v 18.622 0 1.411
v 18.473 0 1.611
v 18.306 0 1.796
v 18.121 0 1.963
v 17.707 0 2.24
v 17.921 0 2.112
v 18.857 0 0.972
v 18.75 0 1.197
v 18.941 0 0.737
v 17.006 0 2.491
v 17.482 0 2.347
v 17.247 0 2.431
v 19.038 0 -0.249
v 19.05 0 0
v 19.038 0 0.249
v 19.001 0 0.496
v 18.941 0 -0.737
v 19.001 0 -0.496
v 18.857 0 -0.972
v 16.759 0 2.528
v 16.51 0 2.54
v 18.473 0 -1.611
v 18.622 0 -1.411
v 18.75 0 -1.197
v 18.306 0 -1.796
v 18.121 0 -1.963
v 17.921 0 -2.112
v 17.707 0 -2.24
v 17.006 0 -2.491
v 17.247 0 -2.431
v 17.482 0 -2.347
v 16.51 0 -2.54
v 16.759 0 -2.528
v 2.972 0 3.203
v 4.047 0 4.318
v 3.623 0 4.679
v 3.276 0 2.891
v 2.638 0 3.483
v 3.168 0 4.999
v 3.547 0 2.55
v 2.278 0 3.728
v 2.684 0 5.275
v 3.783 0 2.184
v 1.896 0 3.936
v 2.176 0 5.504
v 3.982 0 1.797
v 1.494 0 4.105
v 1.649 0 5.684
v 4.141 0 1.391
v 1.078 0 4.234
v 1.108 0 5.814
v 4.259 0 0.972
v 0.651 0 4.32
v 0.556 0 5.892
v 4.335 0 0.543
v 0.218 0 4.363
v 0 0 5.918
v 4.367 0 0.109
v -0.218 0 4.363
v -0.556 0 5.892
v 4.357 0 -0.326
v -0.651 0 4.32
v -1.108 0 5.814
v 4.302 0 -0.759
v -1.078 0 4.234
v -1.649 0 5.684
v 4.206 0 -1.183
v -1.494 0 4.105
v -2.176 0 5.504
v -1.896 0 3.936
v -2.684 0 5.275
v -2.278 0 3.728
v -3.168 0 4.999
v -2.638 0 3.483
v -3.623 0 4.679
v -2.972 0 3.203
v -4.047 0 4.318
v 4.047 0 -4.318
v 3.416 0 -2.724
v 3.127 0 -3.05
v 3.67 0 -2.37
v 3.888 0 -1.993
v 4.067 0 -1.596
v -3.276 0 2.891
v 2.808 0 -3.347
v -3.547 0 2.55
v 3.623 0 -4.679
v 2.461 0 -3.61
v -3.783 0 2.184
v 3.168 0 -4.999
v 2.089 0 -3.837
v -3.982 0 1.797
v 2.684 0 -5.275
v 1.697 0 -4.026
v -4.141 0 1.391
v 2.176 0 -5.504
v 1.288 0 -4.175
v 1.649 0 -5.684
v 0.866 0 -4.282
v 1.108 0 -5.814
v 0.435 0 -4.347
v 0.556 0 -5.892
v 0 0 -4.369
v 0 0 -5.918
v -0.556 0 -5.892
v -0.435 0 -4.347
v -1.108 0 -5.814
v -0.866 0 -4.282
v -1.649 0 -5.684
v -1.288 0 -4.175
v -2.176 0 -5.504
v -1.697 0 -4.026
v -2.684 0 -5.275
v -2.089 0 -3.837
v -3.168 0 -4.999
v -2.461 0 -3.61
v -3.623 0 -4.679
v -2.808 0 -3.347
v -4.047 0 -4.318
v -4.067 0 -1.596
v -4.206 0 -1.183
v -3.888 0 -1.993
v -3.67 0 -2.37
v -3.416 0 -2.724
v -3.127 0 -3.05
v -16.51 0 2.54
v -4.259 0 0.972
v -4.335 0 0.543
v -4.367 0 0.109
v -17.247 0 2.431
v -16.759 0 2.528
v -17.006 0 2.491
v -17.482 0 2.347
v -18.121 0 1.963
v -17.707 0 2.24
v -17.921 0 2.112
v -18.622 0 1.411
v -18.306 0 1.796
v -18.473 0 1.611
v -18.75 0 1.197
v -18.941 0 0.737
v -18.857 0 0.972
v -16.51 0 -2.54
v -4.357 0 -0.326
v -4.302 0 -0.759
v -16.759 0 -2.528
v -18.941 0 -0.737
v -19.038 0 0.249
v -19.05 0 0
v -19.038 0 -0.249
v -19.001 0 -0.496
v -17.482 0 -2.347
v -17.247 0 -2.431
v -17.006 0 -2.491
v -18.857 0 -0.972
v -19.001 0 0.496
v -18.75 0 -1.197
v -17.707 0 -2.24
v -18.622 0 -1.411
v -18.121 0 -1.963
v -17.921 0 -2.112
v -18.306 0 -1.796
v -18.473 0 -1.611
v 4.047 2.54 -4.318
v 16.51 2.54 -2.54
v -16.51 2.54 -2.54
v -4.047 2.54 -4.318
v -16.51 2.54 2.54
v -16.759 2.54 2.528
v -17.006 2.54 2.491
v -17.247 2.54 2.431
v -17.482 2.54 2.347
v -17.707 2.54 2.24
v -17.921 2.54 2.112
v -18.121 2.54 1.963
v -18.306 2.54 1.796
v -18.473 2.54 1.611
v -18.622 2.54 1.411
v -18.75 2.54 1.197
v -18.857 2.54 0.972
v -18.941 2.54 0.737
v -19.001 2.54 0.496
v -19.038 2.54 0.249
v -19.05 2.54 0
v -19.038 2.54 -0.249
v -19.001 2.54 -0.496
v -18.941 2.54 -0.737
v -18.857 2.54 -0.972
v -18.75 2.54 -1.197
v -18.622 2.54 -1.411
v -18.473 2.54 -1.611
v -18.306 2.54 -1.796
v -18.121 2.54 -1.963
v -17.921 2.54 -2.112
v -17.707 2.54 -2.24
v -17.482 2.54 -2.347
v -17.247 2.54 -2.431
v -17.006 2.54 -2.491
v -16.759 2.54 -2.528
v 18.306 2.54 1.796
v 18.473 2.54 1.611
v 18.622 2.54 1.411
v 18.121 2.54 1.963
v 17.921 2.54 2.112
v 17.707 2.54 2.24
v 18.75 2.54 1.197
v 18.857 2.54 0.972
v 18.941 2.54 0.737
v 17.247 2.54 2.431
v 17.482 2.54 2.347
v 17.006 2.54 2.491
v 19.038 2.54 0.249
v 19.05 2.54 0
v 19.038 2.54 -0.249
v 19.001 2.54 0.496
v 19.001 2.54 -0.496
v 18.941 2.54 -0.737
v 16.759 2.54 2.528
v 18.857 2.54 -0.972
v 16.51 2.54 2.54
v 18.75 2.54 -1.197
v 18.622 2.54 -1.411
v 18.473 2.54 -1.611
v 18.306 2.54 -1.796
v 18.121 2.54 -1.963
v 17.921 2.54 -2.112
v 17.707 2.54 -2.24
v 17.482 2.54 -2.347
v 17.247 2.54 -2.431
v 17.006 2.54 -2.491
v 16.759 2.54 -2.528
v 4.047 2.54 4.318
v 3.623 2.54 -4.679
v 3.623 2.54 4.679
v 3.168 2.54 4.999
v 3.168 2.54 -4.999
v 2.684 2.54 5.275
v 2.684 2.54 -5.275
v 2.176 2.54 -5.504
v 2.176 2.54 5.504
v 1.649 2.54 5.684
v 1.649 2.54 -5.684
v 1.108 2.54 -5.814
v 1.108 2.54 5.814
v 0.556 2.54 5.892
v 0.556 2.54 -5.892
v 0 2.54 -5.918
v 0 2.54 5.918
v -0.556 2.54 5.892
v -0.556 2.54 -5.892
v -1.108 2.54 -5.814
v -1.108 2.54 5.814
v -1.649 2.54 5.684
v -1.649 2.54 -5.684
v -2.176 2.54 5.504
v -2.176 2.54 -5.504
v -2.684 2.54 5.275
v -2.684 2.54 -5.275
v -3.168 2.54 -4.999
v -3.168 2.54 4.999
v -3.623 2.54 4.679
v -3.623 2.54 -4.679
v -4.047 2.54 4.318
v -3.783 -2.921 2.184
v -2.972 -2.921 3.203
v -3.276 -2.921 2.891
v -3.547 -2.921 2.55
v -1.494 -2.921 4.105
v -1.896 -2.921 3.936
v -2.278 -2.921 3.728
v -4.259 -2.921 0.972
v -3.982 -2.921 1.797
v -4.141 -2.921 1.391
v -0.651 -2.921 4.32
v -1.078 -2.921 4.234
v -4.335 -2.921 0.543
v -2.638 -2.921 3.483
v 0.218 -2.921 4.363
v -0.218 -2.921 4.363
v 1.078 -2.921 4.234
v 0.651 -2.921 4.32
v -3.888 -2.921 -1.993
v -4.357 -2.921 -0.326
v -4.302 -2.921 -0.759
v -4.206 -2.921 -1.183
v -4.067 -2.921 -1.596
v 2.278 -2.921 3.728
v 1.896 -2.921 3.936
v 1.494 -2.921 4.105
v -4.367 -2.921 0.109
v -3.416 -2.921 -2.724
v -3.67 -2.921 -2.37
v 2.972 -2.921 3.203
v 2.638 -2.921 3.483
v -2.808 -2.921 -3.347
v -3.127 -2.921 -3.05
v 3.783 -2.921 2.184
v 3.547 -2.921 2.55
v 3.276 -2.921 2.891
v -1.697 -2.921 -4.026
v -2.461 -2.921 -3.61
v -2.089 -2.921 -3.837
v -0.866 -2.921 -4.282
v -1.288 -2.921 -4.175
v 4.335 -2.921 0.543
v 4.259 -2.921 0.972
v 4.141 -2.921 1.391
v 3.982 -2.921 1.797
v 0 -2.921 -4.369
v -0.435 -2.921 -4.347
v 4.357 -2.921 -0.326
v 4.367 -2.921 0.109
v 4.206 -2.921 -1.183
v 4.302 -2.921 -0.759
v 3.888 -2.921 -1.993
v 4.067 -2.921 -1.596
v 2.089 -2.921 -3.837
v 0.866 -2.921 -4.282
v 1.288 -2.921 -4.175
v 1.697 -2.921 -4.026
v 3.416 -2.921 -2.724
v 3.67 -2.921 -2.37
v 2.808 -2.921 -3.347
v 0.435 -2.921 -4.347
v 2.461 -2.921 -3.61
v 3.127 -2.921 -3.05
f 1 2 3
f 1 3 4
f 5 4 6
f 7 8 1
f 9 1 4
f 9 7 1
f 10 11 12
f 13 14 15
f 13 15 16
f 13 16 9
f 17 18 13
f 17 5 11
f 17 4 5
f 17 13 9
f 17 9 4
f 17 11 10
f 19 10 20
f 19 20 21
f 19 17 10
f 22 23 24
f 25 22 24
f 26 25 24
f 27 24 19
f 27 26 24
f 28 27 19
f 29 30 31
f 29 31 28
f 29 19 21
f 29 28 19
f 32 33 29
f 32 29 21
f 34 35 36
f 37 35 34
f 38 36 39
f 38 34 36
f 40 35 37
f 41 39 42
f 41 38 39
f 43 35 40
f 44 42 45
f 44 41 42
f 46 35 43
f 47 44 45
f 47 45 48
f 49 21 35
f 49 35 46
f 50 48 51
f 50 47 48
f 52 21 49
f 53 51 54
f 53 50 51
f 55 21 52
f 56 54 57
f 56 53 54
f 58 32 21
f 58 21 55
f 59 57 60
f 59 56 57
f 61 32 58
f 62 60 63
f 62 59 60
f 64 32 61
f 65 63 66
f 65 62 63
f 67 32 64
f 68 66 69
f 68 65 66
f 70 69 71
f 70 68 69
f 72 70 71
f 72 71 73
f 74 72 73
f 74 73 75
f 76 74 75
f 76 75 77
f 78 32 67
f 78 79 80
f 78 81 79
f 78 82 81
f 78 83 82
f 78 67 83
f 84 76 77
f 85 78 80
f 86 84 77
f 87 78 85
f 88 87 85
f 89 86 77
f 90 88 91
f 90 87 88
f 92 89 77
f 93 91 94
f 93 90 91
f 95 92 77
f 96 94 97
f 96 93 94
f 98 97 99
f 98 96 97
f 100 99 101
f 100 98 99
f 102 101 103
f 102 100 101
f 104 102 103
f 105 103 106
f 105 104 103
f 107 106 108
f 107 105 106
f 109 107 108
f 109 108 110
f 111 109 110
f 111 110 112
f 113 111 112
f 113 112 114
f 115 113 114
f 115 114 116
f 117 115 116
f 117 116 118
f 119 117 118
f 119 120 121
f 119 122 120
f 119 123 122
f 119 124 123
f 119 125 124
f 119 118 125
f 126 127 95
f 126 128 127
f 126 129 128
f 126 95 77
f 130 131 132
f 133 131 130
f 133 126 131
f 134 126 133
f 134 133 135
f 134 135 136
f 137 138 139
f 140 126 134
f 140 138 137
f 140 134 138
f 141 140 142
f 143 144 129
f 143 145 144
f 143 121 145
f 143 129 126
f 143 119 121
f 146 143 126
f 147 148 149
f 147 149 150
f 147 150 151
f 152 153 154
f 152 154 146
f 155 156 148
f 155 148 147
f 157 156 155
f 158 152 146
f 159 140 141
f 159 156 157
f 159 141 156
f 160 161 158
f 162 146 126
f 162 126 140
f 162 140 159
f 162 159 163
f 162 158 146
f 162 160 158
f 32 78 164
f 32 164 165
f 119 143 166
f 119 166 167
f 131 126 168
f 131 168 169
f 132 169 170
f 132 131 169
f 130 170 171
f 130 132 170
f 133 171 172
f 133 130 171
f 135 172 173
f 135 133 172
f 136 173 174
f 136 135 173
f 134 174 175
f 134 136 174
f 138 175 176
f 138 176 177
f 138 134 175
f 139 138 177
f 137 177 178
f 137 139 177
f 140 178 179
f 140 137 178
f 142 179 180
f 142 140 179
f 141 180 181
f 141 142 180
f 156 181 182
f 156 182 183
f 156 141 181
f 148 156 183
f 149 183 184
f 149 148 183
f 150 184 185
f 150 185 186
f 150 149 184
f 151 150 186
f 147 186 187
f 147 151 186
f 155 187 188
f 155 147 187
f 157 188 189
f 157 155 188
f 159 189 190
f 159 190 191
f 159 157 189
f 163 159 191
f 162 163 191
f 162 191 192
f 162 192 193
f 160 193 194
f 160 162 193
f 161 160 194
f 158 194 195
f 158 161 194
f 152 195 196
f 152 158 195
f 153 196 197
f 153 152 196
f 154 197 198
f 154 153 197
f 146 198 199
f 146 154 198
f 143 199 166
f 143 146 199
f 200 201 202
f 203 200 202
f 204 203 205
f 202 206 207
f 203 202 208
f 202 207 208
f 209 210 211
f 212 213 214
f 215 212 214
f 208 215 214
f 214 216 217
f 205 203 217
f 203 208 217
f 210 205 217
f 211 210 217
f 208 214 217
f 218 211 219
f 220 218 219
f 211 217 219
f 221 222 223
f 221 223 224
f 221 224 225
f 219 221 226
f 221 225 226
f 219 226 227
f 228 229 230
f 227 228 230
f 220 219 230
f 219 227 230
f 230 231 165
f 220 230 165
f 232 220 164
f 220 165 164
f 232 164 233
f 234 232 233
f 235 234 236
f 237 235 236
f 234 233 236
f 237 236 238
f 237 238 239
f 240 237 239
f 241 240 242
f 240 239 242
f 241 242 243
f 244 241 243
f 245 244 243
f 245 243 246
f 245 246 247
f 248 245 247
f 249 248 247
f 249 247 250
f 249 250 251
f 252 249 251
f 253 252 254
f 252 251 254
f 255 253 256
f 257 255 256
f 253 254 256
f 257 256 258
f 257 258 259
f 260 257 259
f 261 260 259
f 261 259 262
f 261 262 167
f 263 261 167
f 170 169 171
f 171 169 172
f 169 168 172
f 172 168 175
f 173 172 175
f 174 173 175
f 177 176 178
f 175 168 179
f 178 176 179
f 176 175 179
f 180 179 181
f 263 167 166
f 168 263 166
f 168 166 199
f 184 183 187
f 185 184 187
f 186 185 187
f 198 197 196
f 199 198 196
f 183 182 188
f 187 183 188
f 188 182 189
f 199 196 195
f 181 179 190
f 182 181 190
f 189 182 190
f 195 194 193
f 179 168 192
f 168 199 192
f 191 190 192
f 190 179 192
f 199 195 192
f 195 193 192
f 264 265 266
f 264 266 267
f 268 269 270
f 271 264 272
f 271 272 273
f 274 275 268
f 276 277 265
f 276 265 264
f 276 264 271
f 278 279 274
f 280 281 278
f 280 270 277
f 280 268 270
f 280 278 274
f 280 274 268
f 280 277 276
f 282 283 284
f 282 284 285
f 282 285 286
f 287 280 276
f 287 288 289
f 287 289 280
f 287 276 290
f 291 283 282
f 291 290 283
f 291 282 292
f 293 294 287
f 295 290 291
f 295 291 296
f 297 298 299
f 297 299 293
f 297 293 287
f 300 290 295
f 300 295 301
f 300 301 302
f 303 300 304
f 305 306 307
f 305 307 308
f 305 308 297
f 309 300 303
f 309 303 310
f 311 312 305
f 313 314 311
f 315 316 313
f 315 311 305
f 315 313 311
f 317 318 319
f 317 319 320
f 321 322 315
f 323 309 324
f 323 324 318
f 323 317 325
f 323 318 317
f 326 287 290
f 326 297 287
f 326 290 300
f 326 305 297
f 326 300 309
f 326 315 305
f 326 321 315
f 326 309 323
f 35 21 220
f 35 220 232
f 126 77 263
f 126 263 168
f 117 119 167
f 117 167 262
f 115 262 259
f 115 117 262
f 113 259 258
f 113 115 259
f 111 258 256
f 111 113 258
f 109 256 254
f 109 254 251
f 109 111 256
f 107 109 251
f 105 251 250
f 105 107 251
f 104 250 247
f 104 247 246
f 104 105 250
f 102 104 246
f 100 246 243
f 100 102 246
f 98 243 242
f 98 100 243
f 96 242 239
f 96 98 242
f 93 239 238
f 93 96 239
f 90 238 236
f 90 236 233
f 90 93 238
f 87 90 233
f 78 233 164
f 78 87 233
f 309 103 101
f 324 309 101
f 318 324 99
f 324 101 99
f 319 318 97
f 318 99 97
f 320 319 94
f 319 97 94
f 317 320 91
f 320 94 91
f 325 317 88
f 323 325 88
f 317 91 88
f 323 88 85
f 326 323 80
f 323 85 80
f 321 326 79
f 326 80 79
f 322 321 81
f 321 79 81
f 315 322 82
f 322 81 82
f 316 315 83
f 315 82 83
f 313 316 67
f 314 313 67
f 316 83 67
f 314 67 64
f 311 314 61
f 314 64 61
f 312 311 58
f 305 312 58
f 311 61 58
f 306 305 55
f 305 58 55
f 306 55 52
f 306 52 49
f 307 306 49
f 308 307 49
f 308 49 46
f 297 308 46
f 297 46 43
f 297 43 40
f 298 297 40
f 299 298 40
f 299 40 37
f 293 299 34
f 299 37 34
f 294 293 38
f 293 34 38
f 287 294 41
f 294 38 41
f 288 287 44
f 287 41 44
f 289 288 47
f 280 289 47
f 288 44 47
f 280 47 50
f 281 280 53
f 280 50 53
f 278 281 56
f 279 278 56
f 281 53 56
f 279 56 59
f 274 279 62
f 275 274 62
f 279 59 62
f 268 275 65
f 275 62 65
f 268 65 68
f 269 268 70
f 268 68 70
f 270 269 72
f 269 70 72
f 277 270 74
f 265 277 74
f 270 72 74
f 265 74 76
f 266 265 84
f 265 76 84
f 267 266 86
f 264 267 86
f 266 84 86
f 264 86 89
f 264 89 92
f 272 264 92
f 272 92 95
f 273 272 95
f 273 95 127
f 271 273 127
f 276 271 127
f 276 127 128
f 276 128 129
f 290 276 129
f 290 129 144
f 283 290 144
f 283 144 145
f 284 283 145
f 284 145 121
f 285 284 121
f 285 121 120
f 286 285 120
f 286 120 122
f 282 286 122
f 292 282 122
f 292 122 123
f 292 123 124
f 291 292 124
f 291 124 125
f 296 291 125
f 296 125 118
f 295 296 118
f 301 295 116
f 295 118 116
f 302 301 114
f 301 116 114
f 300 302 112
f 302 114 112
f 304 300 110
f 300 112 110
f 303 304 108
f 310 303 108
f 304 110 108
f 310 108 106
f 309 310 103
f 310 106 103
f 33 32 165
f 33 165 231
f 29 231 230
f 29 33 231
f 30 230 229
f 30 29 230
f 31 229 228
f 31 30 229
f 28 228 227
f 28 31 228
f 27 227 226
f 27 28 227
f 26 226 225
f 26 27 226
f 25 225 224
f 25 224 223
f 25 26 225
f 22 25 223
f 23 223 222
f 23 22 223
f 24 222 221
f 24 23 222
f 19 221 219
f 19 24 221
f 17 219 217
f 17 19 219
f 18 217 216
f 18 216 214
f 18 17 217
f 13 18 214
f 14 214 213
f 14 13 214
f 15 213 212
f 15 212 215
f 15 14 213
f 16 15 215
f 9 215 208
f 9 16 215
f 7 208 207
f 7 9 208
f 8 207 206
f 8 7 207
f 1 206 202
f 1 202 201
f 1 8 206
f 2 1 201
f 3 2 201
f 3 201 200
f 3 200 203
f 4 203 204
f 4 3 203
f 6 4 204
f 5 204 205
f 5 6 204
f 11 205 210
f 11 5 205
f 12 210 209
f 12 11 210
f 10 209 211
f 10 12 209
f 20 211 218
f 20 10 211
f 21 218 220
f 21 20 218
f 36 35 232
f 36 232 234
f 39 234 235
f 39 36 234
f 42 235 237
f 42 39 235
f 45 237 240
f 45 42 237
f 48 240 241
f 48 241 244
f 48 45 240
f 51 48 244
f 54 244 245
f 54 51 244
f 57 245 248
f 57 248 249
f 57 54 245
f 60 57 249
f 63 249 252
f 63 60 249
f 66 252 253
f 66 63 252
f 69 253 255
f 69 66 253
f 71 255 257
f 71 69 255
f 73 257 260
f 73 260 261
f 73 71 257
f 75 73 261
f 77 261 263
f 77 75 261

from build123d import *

# Parameters (mm, degrees)
BOSS_EXTRUDE1_DEPTH = 2.54
SKETCH2_R           = 4.3688
BOSS_EXTRUDE2_DEPTH = 2.921


with BuildPart() as part:
    # Sketch1 → Boss-Extrude1 (new body)
    with BuildSketch(Plane(origin=(0, 0, 0), x_dir=(1, 0, 0), z_dir=(0, 1, 0))):
        with BuildLine():
            Line((4.047217222, 4.318), (16.51, 2.54))
            ThreePointArc((16.51, 2.54), (19.05, 0), (16.51, -2.54))
            Line((16.51, -2.54), (4.047217222, -4.318))
            ThreePointArc((4.047217222, -4.318), (0, -5.9182), (-4.047217222, -4.318))
            Line((-4.047217222, -4.318), (-16.51, -2.54))
            ThreePointArc((-16.51, -2.54), (-19.05, 0), (-16.51, 2.54))
            Line((-16.51, 2.54), (-4.047217222, 4.318))
            ThreePointArc((-4.047217222, 4.318), (0, 5.9182), (4.047217222, 4.318))
        make_face()
    extrude(amount=BOSS_EXTRUDE1_DEPTH)

    # Sketch2 → Boss-Extrude2 (add)
    with BuildSketch(Plane.XZ):
        with Locations(Location((0, 0, 0), (0, 0, 270))):
            Circle(SKETCH2_R)
    extrude(amount=BOSS_EXTRUDE2_DEPTH)


solid = part.part
